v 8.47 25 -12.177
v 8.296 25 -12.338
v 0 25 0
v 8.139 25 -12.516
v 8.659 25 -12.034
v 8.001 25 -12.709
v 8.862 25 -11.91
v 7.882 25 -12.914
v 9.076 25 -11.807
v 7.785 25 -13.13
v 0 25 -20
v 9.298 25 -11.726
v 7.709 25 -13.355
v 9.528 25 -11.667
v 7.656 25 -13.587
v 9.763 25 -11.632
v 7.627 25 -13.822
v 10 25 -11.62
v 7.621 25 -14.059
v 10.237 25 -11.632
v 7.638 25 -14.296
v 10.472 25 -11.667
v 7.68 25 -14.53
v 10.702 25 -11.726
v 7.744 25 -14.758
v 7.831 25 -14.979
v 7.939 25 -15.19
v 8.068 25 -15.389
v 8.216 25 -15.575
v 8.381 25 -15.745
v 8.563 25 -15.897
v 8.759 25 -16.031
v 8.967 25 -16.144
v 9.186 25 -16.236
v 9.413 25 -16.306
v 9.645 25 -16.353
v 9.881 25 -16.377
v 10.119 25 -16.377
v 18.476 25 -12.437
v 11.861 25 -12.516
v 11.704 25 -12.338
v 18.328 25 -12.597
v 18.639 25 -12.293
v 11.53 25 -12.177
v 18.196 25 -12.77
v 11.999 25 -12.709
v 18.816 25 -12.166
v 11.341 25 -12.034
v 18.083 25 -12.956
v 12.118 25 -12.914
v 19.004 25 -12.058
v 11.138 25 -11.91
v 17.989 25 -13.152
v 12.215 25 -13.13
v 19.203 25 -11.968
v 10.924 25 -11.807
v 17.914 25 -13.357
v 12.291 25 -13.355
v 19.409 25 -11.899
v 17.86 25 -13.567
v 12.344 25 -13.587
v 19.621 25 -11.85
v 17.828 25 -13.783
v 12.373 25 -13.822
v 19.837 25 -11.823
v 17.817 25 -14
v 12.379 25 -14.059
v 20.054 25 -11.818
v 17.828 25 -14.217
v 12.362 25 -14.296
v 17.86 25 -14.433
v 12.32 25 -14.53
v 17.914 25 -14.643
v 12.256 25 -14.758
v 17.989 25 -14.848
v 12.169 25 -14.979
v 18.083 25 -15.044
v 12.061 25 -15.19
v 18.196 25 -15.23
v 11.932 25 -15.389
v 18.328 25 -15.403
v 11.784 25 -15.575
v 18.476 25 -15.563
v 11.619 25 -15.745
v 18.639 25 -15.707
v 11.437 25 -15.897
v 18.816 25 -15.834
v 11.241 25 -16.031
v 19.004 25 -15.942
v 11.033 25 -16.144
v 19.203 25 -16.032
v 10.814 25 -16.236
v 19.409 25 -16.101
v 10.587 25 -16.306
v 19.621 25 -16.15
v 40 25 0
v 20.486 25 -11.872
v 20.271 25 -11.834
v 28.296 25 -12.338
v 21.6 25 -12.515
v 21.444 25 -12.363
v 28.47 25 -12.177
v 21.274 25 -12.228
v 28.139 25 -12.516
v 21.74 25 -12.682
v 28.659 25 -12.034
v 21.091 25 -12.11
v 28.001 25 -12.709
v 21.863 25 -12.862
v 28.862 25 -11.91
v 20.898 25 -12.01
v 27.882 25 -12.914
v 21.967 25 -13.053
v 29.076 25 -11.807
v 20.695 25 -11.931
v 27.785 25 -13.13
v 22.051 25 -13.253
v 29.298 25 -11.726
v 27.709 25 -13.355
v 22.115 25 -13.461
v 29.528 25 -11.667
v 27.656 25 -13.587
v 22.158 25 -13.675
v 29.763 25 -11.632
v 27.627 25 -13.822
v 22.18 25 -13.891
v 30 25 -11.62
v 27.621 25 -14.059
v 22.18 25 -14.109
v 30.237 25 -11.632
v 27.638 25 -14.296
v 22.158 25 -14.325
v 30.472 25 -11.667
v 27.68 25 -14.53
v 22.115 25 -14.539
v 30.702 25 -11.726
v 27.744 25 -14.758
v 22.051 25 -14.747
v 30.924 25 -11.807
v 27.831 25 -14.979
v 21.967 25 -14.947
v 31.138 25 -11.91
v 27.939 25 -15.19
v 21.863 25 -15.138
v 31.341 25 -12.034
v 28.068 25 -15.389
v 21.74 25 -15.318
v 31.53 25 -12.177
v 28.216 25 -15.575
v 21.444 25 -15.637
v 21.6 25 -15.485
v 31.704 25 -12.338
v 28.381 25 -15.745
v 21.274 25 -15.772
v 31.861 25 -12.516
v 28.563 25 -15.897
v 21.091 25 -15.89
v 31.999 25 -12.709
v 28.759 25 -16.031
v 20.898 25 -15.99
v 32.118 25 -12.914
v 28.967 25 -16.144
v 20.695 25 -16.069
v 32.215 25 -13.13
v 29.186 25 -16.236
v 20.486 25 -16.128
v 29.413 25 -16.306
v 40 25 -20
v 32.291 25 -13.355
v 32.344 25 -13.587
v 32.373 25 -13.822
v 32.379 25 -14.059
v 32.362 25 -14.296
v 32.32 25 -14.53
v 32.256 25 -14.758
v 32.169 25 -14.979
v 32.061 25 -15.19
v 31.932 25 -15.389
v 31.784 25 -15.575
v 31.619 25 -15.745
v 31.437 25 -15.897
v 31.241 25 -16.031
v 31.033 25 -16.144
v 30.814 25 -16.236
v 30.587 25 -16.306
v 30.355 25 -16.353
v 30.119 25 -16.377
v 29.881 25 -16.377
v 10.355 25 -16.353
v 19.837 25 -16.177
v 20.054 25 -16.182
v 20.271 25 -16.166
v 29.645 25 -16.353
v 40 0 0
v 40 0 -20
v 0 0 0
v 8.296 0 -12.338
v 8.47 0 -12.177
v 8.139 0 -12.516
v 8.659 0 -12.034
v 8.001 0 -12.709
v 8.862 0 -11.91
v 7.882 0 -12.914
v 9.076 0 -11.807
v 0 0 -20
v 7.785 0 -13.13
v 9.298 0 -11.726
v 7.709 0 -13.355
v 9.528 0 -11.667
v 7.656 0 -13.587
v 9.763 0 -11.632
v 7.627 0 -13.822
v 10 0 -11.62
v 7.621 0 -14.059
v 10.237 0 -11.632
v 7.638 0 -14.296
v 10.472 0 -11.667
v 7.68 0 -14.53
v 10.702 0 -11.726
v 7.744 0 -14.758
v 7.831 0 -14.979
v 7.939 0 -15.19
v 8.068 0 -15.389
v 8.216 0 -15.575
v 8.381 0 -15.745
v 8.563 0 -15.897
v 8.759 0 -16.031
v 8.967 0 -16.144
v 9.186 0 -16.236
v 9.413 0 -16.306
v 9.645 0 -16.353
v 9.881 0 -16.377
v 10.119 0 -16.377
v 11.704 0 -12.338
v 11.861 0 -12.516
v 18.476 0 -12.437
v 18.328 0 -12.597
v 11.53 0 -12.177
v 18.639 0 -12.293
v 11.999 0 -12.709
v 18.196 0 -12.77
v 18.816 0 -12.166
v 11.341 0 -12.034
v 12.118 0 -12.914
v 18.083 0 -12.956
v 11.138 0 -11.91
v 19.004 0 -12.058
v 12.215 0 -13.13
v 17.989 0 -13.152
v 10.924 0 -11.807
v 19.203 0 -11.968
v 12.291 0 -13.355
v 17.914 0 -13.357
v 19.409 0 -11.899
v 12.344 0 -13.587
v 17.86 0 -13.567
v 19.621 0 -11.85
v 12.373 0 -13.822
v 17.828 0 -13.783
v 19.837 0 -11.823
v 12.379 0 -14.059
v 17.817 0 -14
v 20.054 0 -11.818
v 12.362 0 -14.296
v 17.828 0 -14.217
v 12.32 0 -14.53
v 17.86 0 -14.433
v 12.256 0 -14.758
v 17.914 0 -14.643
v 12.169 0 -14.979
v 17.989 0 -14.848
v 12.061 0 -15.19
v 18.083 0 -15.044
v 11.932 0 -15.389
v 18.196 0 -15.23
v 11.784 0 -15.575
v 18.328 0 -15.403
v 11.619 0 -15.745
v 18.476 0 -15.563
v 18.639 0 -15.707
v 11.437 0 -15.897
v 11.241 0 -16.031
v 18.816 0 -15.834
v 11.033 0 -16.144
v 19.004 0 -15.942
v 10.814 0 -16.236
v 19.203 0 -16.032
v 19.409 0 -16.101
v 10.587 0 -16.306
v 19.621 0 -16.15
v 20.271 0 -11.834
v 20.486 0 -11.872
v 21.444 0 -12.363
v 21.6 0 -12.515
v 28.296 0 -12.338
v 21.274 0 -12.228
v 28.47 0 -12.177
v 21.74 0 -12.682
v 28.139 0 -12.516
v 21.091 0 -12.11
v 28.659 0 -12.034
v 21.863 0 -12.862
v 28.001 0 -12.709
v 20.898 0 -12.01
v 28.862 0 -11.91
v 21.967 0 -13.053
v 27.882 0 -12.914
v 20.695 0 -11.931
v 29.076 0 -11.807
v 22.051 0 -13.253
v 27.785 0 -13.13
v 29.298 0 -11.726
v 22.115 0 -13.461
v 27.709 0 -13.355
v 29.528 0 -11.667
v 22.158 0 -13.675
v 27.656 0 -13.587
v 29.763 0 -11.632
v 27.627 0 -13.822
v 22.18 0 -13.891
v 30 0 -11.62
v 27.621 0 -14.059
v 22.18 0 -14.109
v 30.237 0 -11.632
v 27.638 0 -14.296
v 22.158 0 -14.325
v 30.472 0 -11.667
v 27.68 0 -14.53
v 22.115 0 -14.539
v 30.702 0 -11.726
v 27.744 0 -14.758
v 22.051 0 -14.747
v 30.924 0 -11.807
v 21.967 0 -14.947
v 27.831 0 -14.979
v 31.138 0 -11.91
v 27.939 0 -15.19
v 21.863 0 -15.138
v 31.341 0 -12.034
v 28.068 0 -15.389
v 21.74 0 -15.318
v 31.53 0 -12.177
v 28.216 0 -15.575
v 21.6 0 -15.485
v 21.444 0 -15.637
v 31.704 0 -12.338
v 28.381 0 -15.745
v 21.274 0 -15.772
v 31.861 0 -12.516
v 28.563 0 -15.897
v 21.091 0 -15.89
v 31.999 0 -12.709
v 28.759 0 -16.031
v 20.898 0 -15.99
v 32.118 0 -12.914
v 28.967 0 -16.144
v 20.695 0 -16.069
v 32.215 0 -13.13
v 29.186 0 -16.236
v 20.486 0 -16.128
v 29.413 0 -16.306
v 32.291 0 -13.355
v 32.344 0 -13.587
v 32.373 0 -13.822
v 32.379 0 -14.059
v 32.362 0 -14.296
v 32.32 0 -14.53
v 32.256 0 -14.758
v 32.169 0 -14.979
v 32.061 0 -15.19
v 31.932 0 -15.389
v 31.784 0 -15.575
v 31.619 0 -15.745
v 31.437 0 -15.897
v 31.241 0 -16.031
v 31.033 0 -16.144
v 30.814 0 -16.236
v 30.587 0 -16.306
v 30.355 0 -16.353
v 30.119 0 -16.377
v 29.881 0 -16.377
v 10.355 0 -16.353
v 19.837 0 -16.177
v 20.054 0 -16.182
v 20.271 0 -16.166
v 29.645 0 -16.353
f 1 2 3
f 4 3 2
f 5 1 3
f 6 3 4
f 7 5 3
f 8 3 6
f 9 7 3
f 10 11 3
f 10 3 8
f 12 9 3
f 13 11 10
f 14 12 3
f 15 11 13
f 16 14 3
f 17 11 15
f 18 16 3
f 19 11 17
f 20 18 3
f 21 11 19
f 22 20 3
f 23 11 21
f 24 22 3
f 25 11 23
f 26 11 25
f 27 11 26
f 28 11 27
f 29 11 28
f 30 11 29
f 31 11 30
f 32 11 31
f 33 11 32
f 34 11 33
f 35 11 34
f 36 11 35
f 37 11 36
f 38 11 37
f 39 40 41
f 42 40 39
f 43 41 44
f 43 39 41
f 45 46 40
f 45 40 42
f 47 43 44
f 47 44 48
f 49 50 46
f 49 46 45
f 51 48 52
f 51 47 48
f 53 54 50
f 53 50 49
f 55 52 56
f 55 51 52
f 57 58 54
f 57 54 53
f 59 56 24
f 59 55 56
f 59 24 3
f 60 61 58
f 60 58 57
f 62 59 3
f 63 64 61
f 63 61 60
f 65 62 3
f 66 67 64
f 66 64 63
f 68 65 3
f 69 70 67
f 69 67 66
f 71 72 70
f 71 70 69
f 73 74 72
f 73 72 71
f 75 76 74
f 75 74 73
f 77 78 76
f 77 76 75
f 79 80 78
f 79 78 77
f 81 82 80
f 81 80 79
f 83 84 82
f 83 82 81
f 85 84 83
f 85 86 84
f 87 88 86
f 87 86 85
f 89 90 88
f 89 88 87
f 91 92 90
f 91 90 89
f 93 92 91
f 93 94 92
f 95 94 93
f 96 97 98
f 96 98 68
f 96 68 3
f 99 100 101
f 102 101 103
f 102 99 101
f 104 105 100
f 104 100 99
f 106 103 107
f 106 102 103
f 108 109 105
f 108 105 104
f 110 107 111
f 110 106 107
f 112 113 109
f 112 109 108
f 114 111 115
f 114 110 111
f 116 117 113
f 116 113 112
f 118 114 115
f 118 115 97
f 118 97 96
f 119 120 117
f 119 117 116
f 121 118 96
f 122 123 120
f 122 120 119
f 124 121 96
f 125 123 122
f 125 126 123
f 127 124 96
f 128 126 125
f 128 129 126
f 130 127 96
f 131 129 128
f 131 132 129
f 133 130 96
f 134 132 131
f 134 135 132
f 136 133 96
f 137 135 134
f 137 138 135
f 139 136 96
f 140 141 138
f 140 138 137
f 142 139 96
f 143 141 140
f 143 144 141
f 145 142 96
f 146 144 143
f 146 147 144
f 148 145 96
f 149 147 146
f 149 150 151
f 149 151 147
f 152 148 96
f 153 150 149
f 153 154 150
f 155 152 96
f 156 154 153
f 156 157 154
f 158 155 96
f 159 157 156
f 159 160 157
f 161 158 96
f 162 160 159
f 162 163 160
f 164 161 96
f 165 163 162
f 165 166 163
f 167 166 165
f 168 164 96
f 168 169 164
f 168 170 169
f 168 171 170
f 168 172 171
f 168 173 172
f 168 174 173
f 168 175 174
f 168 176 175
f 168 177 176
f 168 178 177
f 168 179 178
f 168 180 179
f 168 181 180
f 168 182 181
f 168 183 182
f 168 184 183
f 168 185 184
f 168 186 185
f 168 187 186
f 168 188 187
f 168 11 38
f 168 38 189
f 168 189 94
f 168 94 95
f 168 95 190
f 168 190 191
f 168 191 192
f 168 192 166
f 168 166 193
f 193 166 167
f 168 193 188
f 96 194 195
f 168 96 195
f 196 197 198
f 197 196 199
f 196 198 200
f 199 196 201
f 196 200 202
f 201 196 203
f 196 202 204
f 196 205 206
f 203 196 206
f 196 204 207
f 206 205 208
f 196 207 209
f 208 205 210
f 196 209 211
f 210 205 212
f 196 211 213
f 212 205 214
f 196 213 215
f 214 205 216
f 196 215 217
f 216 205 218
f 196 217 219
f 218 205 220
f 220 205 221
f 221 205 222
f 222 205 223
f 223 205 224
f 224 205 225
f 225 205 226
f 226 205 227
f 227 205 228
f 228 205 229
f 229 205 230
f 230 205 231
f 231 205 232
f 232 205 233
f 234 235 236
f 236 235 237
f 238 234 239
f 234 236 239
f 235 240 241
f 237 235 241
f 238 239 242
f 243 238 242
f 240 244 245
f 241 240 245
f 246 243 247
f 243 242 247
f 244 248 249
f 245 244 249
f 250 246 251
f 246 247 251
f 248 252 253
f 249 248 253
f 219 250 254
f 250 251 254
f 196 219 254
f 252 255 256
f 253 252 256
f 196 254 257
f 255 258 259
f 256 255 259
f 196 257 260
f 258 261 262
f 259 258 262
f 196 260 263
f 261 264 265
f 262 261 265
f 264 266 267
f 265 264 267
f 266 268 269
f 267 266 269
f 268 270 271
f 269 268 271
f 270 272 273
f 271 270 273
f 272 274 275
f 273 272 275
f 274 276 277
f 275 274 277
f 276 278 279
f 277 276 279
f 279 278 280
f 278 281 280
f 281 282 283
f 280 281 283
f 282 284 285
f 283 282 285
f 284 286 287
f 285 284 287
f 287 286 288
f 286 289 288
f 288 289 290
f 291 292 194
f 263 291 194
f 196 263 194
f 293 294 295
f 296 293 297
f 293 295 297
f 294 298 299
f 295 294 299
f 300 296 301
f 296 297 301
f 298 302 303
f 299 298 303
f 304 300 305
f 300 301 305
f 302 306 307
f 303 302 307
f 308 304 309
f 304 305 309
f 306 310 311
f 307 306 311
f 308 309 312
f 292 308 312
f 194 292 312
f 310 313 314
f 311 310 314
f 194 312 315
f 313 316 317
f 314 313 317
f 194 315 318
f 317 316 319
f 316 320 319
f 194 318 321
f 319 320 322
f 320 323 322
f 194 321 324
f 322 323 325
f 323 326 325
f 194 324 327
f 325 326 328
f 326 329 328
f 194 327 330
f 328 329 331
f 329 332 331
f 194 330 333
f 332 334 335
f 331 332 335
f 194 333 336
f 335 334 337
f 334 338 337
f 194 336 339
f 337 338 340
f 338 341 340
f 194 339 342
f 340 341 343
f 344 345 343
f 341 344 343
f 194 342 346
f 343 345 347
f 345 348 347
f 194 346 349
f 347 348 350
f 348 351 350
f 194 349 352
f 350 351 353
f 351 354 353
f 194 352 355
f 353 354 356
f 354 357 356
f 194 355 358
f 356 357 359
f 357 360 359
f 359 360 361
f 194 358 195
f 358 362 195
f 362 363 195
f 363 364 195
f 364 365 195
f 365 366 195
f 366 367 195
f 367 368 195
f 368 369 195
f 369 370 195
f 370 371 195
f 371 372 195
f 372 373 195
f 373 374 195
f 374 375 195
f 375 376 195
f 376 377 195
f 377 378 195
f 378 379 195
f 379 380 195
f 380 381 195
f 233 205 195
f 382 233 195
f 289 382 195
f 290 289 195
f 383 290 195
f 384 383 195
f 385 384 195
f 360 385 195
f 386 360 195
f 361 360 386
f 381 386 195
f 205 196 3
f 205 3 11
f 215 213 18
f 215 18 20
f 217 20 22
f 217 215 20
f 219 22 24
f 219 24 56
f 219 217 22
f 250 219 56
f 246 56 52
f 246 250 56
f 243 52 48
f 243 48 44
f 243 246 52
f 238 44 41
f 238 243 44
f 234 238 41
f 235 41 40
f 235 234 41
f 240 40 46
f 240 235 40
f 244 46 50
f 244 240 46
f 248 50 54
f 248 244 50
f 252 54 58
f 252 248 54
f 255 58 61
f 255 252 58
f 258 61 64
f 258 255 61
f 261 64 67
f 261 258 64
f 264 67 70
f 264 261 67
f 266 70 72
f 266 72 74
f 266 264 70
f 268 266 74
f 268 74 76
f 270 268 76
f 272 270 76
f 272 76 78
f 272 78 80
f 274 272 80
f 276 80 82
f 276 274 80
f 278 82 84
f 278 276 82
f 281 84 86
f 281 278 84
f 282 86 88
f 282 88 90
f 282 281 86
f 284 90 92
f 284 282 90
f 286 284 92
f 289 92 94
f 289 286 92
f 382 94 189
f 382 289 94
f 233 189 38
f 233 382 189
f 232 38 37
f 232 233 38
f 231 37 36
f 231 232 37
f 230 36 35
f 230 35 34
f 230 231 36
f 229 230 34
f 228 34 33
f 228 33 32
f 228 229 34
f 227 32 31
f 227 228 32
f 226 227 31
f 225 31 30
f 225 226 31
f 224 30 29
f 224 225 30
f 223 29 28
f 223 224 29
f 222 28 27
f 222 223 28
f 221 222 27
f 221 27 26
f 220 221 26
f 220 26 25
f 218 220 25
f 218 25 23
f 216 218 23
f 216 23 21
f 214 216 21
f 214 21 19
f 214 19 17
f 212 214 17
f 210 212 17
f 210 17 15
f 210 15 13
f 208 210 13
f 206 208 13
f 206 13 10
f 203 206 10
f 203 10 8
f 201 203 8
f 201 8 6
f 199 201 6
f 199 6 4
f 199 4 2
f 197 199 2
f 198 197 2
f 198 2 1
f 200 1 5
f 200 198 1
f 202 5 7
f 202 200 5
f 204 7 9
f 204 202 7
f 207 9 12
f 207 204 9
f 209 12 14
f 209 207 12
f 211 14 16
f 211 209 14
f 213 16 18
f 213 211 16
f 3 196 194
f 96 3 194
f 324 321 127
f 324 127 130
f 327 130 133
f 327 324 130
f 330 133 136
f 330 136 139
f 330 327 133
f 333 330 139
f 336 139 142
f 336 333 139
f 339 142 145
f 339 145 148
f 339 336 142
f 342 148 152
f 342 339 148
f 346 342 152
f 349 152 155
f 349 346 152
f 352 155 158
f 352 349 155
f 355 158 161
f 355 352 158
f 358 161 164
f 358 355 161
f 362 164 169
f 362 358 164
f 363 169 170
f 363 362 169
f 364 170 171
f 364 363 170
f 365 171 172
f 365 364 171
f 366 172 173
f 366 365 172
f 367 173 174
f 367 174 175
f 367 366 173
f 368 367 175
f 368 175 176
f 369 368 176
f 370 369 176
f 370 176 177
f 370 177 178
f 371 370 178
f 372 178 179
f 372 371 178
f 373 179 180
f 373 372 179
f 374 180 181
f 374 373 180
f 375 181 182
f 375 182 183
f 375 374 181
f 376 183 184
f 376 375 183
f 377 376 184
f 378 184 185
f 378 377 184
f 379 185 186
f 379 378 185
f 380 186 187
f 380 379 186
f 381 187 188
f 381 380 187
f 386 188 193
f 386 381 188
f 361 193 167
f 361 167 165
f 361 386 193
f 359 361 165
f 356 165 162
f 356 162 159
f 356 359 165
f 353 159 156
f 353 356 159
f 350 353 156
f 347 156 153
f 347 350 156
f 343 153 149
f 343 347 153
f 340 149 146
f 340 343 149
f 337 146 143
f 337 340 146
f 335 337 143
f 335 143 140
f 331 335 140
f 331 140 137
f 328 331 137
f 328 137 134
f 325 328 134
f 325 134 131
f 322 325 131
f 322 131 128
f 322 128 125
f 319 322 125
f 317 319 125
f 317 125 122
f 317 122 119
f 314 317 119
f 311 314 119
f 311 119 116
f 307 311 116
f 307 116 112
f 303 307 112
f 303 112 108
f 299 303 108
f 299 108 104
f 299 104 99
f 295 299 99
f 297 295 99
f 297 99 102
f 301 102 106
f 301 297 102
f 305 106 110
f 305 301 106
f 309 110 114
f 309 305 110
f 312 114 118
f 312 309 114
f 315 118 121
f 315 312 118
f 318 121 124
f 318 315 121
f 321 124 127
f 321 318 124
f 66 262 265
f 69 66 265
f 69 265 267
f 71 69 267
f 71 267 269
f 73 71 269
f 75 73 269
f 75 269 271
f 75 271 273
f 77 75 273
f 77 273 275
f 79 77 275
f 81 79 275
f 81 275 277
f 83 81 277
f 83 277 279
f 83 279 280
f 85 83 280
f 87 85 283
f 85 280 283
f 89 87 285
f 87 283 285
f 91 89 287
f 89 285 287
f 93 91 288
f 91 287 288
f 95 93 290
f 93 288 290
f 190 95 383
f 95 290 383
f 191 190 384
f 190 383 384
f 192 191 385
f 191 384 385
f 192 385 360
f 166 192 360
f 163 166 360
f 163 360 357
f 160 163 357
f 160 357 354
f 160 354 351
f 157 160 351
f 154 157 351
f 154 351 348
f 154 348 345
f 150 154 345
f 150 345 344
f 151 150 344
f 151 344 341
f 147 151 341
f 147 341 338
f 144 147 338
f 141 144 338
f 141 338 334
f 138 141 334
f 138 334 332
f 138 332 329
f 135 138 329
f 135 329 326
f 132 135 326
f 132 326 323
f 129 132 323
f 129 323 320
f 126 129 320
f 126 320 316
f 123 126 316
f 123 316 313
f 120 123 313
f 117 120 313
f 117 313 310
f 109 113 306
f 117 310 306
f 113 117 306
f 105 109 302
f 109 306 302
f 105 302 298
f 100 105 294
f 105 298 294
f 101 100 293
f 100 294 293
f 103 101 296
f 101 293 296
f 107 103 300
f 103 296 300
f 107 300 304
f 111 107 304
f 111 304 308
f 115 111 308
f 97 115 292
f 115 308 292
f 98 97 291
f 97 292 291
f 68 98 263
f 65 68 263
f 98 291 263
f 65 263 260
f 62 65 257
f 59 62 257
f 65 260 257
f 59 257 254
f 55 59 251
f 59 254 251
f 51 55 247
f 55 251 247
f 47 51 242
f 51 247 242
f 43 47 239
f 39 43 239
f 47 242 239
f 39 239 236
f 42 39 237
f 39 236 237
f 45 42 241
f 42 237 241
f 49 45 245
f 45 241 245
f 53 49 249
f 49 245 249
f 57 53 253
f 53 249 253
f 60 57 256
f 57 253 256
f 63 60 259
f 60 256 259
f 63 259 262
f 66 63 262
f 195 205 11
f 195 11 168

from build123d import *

# Parameters (mm, degrees)
SKETCH1_W                        = 40
SKETCH1_H                        = 20
SKETCH1_R                        = 2.38
BOSS_EXTRUDE1_DEPTH              = 25
F_11_64_0_17188_DIAMETER_HOLE1_D = 4.365752


with BuildPart() as part:
    # Sketch1 → Boss-Extrude1 (new body)
    with BuildSketch(Plane(origin=(0, 0, 0), x_dir=(1, 0, 0), z_dir=(0, 1, 0))):
        with Locations((20, 10)):
            Rectangle(SKETCH1_W, SKETCH1_H)
        with Locations(Location((10, 14, 0), (0, 0, 270))):  # turned: the seam where the file's is
            Circle(SKETCH1_R, mode=Mode.SUBTRACT)
        with Locations(Location((30, 14, 0), (0, 0, 270))):  # turned: the seam where the file's is
            Circle(SKETCH1_R, mode=Mode.SUBTRACT)
    extrude(amount=BOSS_EXTRUDE1_DEPTH)

    # 11/64 (0.17188) Diameter Hole1 (through all)
    with Locations(Plane(origin=(0, 25, 0), x_dir=(1, 0, 0), z_dir=(0, 1, 0))):
        with Locations((20, 14)):
            Hole(F_11_64_0_17188_DIAMETER_HOLE1_D / 2)


solid = part.part
